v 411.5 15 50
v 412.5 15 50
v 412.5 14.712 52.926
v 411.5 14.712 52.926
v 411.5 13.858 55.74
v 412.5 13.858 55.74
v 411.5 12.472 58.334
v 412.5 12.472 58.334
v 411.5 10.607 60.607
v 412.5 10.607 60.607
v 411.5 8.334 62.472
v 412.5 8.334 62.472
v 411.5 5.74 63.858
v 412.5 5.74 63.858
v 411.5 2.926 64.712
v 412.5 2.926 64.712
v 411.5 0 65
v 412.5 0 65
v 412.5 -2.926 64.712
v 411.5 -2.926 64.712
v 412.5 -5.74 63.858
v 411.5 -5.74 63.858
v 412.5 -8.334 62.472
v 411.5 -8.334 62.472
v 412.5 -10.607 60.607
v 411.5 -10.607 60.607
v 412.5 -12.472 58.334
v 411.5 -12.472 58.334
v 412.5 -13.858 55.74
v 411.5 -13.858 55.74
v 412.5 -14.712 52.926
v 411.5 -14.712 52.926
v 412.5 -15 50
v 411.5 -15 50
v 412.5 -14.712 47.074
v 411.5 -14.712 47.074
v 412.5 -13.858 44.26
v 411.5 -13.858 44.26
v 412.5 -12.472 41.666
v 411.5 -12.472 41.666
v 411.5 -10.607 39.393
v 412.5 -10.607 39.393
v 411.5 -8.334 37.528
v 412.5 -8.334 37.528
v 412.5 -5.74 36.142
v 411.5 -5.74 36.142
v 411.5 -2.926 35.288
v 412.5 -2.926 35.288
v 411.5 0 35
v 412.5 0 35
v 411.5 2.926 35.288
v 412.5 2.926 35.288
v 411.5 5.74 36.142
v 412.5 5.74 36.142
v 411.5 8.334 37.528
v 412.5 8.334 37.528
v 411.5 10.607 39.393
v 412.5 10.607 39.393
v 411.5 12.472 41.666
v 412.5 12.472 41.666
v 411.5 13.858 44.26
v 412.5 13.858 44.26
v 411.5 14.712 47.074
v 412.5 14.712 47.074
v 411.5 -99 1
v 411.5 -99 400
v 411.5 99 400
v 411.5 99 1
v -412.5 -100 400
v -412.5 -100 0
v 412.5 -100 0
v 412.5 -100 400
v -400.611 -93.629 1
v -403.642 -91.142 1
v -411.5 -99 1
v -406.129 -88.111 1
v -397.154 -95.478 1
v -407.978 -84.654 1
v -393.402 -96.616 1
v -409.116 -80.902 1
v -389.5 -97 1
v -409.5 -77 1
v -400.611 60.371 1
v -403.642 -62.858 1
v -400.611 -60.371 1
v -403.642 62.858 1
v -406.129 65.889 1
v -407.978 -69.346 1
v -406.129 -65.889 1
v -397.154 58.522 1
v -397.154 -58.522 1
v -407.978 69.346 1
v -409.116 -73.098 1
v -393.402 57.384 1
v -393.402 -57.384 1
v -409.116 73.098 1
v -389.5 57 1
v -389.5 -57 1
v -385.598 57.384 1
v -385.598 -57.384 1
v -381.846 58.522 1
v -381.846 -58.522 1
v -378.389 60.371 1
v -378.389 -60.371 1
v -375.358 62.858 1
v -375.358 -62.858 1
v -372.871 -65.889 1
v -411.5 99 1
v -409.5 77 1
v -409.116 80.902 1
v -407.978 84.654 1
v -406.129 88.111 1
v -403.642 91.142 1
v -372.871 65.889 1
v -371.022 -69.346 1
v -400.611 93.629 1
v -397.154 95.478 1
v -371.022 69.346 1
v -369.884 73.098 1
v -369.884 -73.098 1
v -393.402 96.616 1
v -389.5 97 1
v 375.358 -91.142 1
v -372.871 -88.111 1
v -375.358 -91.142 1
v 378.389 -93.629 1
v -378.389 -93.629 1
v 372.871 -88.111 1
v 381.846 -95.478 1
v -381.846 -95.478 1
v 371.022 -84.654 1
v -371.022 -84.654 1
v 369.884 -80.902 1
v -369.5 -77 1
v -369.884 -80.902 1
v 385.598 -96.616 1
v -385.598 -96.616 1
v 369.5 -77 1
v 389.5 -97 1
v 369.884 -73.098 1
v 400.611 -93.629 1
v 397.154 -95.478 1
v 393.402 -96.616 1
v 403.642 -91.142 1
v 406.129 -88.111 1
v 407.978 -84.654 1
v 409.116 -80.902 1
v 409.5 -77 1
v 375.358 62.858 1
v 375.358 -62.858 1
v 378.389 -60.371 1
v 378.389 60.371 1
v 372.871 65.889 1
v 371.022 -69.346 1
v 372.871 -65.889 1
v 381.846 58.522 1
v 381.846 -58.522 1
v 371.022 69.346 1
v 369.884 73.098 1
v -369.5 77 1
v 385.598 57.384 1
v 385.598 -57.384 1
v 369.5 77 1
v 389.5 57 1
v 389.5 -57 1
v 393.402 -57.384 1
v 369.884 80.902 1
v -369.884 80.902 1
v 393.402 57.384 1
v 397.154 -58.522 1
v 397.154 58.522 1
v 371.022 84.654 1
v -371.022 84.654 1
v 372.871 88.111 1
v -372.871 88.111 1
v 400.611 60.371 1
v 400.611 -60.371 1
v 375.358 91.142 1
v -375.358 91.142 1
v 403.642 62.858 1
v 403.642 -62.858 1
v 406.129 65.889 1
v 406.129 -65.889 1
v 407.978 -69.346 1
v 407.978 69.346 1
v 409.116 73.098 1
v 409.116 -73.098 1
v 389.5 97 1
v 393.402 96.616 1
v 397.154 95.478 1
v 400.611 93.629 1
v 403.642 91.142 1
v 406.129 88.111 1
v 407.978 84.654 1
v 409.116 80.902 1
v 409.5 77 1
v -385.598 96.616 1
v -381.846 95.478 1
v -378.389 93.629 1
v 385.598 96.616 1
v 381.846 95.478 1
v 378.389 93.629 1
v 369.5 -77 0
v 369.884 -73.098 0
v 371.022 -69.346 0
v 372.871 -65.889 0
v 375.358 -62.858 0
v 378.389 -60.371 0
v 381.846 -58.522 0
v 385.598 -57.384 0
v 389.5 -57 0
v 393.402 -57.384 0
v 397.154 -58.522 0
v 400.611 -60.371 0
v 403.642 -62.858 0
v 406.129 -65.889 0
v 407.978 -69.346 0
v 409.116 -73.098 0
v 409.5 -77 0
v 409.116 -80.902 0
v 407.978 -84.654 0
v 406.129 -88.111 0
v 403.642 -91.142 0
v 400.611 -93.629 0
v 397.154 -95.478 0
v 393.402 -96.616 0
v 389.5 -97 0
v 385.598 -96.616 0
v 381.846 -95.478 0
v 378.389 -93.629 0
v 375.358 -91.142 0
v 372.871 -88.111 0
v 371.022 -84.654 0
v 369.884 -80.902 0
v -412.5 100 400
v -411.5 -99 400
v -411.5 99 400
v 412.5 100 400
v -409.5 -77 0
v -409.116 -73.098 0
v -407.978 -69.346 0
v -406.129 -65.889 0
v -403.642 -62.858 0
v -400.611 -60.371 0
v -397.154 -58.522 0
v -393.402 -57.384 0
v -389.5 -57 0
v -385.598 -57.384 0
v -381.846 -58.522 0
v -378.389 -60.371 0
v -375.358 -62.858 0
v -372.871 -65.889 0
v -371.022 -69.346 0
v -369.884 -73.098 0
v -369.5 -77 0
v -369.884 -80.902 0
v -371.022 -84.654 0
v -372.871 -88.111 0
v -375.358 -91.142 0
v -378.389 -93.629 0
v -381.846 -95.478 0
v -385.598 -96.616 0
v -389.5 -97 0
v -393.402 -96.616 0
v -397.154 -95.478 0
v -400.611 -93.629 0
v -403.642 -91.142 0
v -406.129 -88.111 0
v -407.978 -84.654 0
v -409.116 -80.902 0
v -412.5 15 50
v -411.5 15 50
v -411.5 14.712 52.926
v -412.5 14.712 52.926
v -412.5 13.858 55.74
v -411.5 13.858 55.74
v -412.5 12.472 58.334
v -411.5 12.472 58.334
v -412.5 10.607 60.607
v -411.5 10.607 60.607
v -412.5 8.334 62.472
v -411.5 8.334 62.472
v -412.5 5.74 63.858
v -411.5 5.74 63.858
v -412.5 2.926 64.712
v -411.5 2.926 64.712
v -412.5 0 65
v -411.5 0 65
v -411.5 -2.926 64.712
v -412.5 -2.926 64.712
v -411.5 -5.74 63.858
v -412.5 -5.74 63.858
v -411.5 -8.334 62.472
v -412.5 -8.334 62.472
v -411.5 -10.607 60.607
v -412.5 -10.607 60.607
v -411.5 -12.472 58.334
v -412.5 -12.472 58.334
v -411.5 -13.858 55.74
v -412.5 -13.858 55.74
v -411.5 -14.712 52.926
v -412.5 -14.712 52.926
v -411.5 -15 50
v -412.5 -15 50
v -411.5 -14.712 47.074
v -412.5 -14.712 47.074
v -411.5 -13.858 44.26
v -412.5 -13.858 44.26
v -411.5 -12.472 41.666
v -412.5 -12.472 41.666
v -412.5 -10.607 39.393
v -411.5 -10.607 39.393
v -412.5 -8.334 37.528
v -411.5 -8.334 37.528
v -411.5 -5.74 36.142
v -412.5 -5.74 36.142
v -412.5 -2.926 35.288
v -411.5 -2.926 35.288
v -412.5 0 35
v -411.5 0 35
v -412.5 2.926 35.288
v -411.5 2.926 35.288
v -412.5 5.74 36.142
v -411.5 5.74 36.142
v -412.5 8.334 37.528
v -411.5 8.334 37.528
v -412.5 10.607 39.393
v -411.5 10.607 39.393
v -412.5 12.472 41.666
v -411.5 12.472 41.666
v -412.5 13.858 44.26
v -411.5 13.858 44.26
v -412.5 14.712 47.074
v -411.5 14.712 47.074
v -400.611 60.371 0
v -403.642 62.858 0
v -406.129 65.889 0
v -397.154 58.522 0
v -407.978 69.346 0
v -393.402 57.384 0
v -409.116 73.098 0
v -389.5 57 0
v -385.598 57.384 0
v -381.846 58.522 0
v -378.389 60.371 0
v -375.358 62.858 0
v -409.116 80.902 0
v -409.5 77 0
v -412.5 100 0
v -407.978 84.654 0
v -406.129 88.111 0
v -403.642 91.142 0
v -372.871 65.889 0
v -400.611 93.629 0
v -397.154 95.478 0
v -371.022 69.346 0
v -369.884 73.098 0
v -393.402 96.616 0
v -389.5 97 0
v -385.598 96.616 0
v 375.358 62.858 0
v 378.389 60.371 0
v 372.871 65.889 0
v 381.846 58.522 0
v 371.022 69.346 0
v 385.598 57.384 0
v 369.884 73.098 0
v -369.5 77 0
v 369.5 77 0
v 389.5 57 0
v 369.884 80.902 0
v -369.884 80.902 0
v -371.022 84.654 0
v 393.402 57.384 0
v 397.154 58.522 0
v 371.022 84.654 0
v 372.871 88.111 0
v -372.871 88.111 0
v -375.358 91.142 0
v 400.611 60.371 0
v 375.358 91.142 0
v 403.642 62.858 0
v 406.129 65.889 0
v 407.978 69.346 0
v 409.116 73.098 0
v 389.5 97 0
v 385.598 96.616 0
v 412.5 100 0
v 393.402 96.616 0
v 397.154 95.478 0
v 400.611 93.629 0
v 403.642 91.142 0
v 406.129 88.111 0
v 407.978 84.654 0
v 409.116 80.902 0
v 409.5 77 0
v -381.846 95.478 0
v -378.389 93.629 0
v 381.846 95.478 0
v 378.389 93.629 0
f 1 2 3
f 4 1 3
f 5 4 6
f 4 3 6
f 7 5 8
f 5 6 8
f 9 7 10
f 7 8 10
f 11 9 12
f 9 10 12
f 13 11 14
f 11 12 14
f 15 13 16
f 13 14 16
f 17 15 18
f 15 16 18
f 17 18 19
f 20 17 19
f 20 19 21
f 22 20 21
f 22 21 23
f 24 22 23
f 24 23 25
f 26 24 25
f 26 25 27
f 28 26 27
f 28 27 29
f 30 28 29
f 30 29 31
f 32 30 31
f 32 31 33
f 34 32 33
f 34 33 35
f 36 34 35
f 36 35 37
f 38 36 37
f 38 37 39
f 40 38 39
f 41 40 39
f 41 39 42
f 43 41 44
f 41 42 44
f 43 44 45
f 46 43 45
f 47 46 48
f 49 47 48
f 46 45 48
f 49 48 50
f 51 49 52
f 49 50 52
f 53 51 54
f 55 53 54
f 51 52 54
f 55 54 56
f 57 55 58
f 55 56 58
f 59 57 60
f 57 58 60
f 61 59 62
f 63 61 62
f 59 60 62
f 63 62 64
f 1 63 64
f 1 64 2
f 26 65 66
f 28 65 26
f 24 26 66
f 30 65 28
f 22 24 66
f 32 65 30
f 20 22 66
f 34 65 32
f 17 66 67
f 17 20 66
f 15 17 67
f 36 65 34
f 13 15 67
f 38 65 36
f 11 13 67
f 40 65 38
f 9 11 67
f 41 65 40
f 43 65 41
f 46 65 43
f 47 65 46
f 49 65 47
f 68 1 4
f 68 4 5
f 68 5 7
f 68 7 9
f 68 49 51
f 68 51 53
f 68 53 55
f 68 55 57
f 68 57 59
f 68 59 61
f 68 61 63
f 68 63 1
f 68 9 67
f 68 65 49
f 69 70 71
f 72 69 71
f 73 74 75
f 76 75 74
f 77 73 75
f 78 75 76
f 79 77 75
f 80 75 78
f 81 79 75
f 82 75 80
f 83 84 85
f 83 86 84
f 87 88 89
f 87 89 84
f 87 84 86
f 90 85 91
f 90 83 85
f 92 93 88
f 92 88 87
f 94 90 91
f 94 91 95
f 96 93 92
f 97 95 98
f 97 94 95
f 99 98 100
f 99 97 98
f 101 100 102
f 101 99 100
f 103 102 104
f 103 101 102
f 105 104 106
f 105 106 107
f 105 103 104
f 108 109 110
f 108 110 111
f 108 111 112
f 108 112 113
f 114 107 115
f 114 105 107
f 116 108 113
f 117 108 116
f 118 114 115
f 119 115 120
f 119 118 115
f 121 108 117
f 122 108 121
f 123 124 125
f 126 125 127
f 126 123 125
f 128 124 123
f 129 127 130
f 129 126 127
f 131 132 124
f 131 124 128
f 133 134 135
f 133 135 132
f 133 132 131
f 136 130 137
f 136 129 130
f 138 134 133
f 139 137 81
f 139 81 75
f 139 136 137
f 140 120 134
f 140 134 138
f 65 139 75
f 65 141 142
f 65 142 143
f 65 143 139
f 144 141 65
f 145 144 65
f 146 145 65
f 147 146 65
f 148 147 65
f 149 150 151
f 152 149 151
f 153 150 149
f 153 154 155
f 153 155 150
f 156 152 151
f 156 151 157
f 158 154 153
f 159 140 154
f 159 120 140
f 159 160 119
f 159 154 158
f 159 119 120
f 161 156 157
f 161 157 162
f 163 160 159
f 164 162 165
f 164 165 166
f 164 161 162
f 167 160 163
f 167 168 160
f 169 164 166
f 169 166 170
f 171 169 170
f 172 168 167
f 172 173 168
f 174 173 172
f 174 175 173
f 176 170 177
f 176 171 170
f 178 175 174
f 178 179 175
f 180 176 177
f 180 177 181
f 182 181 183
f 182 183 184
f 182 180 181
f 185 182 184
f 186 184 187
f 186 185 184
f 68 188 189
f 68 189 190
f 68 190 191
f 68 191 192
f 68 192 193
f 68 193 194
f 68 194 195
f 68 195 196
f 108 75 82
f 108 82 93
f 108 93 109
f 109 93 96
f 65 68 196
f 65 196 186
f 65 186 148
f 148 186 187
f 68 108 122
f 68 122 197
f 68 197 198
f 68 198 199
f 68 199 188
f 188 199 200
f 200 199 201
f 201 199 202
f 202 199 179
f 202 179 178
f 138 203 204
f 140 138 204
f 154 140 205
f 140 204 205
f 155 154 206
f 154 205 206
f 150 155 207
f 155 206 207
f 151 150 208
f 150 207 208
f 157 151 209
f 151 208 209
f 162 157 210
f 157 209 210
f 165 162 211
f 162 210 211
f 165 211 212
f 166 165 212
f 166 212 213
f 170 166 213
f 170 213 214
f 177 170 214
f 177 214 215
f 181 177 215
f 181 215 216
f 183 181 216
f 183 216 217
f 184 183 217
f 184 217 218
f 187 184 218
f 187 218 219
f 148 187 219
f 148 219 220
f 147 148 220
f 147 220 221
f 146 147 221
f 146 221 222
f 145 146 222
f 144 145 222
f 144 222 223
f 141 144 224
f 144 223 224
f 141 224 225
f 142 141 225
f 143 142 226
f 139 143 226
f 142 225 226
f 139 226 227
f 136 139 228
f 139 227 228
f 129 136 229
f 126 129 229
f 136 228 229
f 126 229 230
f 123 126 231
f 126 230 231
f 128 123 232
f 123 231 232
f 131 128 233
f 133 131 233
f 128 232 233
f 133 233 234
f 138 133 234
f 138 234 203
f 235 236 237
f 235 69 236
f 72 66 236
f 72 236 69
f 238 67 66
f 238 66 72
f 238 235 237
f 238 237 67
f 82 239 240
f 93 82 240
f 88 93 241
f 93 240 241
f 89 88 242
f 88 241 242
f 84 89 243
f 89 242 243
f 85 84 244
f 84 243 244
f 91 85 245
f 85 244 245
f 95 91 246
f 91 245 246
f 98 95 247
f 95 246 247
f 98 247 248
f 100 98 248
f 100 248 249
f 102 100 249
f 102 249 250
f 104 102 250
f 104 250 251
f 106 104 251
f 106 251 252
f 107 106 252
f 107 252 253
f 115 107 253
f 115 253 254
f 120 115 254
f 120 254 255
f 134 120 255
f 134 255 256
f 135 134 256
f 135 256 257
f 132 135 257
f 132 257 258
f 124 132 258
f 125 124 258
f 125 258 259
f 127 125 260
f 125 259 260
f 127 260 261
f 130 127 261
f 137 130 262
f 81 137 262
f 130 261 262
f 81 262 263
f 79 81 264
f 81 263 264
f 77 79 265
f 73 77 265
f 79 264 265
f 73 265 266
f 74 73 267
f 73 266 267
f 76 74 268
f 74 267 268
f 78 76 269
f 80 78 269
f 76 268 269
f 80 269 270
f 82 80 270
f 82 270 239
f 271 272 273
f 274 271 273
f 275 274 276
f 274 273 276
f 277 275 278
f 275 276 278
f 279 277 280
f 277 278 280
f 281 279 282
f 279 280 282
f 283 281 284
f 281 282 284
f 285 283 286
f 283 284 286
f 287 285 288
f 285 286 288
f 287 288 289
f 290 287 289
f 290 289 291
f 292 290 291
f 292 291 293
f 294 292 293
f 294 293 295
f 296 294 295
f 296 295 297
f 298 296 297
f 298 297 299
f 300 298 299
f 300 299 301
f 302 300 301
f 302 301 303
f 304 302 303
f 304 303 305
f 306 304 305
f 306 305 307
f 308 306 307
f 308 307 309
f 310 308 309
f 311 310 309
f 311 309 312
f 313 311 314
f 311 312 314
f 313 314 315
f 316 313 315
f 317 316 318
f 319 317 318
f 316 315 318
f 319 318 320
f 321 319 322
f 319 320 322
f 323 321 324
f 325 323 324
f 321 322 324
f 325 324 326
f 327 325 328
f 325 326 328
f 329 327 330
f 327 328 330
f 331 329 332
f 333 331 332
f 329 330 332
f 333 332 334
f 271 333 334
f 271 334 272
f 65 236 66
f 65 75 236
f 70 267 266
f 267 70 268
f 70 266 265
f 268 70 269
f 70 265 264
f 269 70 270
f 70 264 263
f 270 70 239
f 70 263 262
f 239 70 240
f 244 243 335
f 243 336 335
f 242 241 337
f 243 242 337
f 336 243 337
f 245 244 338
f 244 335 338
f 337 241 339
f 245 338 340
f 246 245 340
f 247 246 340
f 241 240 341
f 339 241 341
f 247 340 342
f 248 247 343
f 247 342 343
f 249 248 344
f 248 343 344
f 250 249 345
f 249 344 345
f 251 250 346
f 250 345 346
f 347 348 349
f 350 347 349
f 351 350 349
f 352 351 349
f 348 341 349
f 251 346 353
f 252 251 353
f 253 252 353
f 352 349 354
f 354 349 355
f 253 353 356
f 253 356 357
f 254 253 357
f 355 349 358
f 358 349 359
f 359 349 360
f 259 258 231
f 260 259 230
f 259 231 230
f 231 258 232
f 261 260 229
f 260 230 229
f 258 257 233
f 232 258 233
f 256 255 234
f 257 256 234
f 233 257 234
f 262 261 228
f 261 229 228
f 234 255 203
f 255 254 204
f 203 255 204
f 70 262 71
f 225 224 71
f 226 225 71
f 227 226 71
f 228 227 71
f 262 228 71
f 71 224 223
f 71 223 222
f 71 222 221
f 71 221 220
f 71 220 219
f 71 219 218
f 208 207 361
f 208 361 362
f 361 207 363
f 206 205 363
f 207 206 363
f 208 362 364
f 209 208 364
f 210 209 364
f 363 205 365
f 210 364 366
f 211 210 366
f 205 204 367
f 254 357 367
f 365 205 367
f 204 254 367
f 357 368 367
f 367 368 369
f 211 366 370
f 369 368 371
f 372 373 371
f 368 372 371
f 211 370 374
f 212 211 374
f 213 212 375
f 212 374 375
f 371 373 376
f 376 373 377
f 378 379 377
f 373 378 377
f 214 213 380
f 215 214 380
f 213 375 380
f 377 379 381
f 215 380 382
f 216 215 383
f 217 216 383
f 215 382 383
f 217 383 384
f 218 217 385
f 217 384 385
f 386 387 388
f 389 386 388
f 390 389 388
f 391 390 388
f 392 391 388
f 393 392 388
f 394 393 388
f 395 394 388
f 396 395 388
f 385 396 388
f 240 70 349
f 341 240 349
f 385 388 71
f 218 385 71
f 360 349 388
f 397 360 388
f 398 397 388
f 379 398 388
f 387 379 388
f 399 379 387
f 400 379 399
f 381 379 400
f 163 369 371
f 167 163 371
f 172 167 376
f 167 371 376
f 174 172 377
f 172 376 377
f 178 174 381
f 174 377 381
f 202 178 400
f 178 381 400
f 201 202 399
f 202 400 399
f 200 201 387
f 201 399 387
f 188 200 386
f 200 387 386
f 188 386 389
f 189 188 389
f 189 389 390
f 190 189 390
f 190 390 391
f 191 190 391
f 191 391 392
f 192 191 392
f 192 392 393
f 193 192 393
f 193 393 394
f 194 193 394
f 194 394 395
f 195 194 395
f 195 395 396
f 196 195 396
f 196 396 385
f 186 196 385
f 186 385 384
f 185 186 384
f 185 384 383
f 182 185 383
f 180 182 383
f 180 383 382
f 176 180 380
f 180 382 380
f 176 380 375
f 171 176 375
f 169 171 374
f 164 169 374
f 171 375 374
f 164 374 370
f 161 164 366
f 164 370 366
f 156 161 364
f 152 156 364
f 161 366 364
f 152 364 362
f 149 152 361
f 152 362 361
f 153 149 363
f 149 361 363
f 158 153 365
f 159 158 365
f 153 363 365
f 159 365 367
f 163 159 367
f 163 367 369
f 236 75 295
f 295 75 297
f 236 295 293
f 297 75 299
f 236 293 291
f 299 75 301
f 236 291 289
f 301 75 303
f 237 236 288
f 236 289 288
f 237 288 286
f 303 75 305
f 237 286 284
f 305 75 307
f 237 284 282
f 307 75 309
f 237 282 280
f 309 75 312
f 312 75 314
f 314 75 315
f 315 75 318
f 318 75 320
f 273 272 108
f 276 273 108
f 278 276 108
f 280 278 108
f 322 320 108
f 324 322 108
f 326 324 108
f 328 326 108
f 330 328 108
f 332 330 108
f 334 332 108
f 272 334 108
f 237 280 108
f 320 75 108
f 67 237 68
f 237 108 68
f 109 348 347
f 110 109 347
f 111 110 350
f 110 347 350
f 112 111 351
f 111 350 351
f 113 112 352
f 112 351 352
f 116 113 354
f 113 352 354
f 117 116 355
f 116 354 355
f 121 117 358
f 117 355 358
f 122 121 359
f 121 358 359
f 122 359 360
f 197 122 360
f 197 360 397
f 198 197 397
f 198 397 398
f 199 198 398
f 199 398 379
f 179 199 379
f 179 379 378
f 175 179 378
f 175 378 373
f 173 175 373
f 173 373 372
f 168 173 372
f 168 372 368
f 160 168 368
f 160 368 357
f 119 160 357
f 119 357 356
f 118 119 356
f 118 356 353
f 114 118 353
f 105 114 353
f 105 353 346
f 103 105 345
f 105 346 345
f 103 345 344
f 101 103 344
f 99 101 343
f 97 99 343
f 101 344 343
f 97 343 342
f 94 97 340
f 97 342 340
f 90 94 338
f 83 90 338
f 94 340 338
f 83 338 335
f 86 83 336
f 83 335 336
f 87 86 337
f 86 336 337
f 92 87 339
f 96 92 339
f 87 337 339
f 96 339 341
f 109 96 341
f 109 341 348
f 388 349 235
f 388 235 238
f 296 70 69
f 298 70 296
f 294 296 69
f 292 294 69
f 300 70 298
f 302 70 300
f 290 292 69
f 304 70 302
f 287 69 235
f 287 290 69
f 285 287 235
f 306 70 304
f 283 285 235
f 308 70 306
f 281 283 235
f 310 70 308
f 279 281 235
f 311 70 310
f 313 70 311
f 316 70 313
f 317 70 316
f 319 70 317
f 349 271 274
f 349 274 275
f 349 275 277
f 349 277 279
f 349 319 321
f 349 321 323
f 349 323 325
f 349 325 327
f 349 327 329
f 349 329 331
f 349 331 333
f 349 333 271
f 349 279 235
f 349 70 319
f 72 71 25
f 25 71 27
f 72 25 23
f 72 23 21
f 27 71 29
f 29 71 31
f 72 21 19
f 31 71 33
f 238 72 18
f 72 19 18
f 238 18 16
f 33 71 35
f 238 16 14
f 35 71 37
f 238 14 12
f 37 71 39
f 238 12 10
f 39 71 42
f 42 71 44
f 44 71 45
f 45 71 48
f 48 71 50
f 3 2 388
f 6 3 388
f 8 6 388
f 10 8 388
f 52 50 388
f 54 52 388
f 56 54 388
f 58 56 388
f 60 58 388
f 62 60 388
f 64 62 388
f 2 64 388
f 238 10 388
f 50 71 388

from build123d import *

# Parameters (mm, degrees)
F0_W     = 825
F0_H     = 200
F1_DEPTH = 400
F2_T     = -1
F5_D     = 40
F7_D     = 30


# Not quite as in the source:
# - the program builds the solid bodies; features that only make, move or delete a surface that nothing else refers to are left out


with BuildPart() as f1:
    # F0 (on Top) → F1 (new body)
    with BuildSketch(Plane.XY):
        Rectangle(F0_W, F0_H)
    extrude(amount=F1_DEPTH)

    # F2
    f2_openings = [f1.faces().sort_by_distance(p)[0] for p in [
        (0, 0, 400),
    ]]
    offset(amount=F2_T, openings=f2_openings)

    # F5 (through all)
    with Locations(Plane.XY.offset(1)):
        with Locations((389.5, 77), (389.5, -77), (-389.5, 77), (-389.5, -77)):
            Hole(F5_D / 2)

    # F7 (through all)
    with Locations(Plane(origin=(-412.5, 0, 0), x_dir=(0, -1, 0), z_dir=(-1, 0, 0))):
        with Locations((0, 50)):
            Hole(F7_D / 2)


solid = f1.part
